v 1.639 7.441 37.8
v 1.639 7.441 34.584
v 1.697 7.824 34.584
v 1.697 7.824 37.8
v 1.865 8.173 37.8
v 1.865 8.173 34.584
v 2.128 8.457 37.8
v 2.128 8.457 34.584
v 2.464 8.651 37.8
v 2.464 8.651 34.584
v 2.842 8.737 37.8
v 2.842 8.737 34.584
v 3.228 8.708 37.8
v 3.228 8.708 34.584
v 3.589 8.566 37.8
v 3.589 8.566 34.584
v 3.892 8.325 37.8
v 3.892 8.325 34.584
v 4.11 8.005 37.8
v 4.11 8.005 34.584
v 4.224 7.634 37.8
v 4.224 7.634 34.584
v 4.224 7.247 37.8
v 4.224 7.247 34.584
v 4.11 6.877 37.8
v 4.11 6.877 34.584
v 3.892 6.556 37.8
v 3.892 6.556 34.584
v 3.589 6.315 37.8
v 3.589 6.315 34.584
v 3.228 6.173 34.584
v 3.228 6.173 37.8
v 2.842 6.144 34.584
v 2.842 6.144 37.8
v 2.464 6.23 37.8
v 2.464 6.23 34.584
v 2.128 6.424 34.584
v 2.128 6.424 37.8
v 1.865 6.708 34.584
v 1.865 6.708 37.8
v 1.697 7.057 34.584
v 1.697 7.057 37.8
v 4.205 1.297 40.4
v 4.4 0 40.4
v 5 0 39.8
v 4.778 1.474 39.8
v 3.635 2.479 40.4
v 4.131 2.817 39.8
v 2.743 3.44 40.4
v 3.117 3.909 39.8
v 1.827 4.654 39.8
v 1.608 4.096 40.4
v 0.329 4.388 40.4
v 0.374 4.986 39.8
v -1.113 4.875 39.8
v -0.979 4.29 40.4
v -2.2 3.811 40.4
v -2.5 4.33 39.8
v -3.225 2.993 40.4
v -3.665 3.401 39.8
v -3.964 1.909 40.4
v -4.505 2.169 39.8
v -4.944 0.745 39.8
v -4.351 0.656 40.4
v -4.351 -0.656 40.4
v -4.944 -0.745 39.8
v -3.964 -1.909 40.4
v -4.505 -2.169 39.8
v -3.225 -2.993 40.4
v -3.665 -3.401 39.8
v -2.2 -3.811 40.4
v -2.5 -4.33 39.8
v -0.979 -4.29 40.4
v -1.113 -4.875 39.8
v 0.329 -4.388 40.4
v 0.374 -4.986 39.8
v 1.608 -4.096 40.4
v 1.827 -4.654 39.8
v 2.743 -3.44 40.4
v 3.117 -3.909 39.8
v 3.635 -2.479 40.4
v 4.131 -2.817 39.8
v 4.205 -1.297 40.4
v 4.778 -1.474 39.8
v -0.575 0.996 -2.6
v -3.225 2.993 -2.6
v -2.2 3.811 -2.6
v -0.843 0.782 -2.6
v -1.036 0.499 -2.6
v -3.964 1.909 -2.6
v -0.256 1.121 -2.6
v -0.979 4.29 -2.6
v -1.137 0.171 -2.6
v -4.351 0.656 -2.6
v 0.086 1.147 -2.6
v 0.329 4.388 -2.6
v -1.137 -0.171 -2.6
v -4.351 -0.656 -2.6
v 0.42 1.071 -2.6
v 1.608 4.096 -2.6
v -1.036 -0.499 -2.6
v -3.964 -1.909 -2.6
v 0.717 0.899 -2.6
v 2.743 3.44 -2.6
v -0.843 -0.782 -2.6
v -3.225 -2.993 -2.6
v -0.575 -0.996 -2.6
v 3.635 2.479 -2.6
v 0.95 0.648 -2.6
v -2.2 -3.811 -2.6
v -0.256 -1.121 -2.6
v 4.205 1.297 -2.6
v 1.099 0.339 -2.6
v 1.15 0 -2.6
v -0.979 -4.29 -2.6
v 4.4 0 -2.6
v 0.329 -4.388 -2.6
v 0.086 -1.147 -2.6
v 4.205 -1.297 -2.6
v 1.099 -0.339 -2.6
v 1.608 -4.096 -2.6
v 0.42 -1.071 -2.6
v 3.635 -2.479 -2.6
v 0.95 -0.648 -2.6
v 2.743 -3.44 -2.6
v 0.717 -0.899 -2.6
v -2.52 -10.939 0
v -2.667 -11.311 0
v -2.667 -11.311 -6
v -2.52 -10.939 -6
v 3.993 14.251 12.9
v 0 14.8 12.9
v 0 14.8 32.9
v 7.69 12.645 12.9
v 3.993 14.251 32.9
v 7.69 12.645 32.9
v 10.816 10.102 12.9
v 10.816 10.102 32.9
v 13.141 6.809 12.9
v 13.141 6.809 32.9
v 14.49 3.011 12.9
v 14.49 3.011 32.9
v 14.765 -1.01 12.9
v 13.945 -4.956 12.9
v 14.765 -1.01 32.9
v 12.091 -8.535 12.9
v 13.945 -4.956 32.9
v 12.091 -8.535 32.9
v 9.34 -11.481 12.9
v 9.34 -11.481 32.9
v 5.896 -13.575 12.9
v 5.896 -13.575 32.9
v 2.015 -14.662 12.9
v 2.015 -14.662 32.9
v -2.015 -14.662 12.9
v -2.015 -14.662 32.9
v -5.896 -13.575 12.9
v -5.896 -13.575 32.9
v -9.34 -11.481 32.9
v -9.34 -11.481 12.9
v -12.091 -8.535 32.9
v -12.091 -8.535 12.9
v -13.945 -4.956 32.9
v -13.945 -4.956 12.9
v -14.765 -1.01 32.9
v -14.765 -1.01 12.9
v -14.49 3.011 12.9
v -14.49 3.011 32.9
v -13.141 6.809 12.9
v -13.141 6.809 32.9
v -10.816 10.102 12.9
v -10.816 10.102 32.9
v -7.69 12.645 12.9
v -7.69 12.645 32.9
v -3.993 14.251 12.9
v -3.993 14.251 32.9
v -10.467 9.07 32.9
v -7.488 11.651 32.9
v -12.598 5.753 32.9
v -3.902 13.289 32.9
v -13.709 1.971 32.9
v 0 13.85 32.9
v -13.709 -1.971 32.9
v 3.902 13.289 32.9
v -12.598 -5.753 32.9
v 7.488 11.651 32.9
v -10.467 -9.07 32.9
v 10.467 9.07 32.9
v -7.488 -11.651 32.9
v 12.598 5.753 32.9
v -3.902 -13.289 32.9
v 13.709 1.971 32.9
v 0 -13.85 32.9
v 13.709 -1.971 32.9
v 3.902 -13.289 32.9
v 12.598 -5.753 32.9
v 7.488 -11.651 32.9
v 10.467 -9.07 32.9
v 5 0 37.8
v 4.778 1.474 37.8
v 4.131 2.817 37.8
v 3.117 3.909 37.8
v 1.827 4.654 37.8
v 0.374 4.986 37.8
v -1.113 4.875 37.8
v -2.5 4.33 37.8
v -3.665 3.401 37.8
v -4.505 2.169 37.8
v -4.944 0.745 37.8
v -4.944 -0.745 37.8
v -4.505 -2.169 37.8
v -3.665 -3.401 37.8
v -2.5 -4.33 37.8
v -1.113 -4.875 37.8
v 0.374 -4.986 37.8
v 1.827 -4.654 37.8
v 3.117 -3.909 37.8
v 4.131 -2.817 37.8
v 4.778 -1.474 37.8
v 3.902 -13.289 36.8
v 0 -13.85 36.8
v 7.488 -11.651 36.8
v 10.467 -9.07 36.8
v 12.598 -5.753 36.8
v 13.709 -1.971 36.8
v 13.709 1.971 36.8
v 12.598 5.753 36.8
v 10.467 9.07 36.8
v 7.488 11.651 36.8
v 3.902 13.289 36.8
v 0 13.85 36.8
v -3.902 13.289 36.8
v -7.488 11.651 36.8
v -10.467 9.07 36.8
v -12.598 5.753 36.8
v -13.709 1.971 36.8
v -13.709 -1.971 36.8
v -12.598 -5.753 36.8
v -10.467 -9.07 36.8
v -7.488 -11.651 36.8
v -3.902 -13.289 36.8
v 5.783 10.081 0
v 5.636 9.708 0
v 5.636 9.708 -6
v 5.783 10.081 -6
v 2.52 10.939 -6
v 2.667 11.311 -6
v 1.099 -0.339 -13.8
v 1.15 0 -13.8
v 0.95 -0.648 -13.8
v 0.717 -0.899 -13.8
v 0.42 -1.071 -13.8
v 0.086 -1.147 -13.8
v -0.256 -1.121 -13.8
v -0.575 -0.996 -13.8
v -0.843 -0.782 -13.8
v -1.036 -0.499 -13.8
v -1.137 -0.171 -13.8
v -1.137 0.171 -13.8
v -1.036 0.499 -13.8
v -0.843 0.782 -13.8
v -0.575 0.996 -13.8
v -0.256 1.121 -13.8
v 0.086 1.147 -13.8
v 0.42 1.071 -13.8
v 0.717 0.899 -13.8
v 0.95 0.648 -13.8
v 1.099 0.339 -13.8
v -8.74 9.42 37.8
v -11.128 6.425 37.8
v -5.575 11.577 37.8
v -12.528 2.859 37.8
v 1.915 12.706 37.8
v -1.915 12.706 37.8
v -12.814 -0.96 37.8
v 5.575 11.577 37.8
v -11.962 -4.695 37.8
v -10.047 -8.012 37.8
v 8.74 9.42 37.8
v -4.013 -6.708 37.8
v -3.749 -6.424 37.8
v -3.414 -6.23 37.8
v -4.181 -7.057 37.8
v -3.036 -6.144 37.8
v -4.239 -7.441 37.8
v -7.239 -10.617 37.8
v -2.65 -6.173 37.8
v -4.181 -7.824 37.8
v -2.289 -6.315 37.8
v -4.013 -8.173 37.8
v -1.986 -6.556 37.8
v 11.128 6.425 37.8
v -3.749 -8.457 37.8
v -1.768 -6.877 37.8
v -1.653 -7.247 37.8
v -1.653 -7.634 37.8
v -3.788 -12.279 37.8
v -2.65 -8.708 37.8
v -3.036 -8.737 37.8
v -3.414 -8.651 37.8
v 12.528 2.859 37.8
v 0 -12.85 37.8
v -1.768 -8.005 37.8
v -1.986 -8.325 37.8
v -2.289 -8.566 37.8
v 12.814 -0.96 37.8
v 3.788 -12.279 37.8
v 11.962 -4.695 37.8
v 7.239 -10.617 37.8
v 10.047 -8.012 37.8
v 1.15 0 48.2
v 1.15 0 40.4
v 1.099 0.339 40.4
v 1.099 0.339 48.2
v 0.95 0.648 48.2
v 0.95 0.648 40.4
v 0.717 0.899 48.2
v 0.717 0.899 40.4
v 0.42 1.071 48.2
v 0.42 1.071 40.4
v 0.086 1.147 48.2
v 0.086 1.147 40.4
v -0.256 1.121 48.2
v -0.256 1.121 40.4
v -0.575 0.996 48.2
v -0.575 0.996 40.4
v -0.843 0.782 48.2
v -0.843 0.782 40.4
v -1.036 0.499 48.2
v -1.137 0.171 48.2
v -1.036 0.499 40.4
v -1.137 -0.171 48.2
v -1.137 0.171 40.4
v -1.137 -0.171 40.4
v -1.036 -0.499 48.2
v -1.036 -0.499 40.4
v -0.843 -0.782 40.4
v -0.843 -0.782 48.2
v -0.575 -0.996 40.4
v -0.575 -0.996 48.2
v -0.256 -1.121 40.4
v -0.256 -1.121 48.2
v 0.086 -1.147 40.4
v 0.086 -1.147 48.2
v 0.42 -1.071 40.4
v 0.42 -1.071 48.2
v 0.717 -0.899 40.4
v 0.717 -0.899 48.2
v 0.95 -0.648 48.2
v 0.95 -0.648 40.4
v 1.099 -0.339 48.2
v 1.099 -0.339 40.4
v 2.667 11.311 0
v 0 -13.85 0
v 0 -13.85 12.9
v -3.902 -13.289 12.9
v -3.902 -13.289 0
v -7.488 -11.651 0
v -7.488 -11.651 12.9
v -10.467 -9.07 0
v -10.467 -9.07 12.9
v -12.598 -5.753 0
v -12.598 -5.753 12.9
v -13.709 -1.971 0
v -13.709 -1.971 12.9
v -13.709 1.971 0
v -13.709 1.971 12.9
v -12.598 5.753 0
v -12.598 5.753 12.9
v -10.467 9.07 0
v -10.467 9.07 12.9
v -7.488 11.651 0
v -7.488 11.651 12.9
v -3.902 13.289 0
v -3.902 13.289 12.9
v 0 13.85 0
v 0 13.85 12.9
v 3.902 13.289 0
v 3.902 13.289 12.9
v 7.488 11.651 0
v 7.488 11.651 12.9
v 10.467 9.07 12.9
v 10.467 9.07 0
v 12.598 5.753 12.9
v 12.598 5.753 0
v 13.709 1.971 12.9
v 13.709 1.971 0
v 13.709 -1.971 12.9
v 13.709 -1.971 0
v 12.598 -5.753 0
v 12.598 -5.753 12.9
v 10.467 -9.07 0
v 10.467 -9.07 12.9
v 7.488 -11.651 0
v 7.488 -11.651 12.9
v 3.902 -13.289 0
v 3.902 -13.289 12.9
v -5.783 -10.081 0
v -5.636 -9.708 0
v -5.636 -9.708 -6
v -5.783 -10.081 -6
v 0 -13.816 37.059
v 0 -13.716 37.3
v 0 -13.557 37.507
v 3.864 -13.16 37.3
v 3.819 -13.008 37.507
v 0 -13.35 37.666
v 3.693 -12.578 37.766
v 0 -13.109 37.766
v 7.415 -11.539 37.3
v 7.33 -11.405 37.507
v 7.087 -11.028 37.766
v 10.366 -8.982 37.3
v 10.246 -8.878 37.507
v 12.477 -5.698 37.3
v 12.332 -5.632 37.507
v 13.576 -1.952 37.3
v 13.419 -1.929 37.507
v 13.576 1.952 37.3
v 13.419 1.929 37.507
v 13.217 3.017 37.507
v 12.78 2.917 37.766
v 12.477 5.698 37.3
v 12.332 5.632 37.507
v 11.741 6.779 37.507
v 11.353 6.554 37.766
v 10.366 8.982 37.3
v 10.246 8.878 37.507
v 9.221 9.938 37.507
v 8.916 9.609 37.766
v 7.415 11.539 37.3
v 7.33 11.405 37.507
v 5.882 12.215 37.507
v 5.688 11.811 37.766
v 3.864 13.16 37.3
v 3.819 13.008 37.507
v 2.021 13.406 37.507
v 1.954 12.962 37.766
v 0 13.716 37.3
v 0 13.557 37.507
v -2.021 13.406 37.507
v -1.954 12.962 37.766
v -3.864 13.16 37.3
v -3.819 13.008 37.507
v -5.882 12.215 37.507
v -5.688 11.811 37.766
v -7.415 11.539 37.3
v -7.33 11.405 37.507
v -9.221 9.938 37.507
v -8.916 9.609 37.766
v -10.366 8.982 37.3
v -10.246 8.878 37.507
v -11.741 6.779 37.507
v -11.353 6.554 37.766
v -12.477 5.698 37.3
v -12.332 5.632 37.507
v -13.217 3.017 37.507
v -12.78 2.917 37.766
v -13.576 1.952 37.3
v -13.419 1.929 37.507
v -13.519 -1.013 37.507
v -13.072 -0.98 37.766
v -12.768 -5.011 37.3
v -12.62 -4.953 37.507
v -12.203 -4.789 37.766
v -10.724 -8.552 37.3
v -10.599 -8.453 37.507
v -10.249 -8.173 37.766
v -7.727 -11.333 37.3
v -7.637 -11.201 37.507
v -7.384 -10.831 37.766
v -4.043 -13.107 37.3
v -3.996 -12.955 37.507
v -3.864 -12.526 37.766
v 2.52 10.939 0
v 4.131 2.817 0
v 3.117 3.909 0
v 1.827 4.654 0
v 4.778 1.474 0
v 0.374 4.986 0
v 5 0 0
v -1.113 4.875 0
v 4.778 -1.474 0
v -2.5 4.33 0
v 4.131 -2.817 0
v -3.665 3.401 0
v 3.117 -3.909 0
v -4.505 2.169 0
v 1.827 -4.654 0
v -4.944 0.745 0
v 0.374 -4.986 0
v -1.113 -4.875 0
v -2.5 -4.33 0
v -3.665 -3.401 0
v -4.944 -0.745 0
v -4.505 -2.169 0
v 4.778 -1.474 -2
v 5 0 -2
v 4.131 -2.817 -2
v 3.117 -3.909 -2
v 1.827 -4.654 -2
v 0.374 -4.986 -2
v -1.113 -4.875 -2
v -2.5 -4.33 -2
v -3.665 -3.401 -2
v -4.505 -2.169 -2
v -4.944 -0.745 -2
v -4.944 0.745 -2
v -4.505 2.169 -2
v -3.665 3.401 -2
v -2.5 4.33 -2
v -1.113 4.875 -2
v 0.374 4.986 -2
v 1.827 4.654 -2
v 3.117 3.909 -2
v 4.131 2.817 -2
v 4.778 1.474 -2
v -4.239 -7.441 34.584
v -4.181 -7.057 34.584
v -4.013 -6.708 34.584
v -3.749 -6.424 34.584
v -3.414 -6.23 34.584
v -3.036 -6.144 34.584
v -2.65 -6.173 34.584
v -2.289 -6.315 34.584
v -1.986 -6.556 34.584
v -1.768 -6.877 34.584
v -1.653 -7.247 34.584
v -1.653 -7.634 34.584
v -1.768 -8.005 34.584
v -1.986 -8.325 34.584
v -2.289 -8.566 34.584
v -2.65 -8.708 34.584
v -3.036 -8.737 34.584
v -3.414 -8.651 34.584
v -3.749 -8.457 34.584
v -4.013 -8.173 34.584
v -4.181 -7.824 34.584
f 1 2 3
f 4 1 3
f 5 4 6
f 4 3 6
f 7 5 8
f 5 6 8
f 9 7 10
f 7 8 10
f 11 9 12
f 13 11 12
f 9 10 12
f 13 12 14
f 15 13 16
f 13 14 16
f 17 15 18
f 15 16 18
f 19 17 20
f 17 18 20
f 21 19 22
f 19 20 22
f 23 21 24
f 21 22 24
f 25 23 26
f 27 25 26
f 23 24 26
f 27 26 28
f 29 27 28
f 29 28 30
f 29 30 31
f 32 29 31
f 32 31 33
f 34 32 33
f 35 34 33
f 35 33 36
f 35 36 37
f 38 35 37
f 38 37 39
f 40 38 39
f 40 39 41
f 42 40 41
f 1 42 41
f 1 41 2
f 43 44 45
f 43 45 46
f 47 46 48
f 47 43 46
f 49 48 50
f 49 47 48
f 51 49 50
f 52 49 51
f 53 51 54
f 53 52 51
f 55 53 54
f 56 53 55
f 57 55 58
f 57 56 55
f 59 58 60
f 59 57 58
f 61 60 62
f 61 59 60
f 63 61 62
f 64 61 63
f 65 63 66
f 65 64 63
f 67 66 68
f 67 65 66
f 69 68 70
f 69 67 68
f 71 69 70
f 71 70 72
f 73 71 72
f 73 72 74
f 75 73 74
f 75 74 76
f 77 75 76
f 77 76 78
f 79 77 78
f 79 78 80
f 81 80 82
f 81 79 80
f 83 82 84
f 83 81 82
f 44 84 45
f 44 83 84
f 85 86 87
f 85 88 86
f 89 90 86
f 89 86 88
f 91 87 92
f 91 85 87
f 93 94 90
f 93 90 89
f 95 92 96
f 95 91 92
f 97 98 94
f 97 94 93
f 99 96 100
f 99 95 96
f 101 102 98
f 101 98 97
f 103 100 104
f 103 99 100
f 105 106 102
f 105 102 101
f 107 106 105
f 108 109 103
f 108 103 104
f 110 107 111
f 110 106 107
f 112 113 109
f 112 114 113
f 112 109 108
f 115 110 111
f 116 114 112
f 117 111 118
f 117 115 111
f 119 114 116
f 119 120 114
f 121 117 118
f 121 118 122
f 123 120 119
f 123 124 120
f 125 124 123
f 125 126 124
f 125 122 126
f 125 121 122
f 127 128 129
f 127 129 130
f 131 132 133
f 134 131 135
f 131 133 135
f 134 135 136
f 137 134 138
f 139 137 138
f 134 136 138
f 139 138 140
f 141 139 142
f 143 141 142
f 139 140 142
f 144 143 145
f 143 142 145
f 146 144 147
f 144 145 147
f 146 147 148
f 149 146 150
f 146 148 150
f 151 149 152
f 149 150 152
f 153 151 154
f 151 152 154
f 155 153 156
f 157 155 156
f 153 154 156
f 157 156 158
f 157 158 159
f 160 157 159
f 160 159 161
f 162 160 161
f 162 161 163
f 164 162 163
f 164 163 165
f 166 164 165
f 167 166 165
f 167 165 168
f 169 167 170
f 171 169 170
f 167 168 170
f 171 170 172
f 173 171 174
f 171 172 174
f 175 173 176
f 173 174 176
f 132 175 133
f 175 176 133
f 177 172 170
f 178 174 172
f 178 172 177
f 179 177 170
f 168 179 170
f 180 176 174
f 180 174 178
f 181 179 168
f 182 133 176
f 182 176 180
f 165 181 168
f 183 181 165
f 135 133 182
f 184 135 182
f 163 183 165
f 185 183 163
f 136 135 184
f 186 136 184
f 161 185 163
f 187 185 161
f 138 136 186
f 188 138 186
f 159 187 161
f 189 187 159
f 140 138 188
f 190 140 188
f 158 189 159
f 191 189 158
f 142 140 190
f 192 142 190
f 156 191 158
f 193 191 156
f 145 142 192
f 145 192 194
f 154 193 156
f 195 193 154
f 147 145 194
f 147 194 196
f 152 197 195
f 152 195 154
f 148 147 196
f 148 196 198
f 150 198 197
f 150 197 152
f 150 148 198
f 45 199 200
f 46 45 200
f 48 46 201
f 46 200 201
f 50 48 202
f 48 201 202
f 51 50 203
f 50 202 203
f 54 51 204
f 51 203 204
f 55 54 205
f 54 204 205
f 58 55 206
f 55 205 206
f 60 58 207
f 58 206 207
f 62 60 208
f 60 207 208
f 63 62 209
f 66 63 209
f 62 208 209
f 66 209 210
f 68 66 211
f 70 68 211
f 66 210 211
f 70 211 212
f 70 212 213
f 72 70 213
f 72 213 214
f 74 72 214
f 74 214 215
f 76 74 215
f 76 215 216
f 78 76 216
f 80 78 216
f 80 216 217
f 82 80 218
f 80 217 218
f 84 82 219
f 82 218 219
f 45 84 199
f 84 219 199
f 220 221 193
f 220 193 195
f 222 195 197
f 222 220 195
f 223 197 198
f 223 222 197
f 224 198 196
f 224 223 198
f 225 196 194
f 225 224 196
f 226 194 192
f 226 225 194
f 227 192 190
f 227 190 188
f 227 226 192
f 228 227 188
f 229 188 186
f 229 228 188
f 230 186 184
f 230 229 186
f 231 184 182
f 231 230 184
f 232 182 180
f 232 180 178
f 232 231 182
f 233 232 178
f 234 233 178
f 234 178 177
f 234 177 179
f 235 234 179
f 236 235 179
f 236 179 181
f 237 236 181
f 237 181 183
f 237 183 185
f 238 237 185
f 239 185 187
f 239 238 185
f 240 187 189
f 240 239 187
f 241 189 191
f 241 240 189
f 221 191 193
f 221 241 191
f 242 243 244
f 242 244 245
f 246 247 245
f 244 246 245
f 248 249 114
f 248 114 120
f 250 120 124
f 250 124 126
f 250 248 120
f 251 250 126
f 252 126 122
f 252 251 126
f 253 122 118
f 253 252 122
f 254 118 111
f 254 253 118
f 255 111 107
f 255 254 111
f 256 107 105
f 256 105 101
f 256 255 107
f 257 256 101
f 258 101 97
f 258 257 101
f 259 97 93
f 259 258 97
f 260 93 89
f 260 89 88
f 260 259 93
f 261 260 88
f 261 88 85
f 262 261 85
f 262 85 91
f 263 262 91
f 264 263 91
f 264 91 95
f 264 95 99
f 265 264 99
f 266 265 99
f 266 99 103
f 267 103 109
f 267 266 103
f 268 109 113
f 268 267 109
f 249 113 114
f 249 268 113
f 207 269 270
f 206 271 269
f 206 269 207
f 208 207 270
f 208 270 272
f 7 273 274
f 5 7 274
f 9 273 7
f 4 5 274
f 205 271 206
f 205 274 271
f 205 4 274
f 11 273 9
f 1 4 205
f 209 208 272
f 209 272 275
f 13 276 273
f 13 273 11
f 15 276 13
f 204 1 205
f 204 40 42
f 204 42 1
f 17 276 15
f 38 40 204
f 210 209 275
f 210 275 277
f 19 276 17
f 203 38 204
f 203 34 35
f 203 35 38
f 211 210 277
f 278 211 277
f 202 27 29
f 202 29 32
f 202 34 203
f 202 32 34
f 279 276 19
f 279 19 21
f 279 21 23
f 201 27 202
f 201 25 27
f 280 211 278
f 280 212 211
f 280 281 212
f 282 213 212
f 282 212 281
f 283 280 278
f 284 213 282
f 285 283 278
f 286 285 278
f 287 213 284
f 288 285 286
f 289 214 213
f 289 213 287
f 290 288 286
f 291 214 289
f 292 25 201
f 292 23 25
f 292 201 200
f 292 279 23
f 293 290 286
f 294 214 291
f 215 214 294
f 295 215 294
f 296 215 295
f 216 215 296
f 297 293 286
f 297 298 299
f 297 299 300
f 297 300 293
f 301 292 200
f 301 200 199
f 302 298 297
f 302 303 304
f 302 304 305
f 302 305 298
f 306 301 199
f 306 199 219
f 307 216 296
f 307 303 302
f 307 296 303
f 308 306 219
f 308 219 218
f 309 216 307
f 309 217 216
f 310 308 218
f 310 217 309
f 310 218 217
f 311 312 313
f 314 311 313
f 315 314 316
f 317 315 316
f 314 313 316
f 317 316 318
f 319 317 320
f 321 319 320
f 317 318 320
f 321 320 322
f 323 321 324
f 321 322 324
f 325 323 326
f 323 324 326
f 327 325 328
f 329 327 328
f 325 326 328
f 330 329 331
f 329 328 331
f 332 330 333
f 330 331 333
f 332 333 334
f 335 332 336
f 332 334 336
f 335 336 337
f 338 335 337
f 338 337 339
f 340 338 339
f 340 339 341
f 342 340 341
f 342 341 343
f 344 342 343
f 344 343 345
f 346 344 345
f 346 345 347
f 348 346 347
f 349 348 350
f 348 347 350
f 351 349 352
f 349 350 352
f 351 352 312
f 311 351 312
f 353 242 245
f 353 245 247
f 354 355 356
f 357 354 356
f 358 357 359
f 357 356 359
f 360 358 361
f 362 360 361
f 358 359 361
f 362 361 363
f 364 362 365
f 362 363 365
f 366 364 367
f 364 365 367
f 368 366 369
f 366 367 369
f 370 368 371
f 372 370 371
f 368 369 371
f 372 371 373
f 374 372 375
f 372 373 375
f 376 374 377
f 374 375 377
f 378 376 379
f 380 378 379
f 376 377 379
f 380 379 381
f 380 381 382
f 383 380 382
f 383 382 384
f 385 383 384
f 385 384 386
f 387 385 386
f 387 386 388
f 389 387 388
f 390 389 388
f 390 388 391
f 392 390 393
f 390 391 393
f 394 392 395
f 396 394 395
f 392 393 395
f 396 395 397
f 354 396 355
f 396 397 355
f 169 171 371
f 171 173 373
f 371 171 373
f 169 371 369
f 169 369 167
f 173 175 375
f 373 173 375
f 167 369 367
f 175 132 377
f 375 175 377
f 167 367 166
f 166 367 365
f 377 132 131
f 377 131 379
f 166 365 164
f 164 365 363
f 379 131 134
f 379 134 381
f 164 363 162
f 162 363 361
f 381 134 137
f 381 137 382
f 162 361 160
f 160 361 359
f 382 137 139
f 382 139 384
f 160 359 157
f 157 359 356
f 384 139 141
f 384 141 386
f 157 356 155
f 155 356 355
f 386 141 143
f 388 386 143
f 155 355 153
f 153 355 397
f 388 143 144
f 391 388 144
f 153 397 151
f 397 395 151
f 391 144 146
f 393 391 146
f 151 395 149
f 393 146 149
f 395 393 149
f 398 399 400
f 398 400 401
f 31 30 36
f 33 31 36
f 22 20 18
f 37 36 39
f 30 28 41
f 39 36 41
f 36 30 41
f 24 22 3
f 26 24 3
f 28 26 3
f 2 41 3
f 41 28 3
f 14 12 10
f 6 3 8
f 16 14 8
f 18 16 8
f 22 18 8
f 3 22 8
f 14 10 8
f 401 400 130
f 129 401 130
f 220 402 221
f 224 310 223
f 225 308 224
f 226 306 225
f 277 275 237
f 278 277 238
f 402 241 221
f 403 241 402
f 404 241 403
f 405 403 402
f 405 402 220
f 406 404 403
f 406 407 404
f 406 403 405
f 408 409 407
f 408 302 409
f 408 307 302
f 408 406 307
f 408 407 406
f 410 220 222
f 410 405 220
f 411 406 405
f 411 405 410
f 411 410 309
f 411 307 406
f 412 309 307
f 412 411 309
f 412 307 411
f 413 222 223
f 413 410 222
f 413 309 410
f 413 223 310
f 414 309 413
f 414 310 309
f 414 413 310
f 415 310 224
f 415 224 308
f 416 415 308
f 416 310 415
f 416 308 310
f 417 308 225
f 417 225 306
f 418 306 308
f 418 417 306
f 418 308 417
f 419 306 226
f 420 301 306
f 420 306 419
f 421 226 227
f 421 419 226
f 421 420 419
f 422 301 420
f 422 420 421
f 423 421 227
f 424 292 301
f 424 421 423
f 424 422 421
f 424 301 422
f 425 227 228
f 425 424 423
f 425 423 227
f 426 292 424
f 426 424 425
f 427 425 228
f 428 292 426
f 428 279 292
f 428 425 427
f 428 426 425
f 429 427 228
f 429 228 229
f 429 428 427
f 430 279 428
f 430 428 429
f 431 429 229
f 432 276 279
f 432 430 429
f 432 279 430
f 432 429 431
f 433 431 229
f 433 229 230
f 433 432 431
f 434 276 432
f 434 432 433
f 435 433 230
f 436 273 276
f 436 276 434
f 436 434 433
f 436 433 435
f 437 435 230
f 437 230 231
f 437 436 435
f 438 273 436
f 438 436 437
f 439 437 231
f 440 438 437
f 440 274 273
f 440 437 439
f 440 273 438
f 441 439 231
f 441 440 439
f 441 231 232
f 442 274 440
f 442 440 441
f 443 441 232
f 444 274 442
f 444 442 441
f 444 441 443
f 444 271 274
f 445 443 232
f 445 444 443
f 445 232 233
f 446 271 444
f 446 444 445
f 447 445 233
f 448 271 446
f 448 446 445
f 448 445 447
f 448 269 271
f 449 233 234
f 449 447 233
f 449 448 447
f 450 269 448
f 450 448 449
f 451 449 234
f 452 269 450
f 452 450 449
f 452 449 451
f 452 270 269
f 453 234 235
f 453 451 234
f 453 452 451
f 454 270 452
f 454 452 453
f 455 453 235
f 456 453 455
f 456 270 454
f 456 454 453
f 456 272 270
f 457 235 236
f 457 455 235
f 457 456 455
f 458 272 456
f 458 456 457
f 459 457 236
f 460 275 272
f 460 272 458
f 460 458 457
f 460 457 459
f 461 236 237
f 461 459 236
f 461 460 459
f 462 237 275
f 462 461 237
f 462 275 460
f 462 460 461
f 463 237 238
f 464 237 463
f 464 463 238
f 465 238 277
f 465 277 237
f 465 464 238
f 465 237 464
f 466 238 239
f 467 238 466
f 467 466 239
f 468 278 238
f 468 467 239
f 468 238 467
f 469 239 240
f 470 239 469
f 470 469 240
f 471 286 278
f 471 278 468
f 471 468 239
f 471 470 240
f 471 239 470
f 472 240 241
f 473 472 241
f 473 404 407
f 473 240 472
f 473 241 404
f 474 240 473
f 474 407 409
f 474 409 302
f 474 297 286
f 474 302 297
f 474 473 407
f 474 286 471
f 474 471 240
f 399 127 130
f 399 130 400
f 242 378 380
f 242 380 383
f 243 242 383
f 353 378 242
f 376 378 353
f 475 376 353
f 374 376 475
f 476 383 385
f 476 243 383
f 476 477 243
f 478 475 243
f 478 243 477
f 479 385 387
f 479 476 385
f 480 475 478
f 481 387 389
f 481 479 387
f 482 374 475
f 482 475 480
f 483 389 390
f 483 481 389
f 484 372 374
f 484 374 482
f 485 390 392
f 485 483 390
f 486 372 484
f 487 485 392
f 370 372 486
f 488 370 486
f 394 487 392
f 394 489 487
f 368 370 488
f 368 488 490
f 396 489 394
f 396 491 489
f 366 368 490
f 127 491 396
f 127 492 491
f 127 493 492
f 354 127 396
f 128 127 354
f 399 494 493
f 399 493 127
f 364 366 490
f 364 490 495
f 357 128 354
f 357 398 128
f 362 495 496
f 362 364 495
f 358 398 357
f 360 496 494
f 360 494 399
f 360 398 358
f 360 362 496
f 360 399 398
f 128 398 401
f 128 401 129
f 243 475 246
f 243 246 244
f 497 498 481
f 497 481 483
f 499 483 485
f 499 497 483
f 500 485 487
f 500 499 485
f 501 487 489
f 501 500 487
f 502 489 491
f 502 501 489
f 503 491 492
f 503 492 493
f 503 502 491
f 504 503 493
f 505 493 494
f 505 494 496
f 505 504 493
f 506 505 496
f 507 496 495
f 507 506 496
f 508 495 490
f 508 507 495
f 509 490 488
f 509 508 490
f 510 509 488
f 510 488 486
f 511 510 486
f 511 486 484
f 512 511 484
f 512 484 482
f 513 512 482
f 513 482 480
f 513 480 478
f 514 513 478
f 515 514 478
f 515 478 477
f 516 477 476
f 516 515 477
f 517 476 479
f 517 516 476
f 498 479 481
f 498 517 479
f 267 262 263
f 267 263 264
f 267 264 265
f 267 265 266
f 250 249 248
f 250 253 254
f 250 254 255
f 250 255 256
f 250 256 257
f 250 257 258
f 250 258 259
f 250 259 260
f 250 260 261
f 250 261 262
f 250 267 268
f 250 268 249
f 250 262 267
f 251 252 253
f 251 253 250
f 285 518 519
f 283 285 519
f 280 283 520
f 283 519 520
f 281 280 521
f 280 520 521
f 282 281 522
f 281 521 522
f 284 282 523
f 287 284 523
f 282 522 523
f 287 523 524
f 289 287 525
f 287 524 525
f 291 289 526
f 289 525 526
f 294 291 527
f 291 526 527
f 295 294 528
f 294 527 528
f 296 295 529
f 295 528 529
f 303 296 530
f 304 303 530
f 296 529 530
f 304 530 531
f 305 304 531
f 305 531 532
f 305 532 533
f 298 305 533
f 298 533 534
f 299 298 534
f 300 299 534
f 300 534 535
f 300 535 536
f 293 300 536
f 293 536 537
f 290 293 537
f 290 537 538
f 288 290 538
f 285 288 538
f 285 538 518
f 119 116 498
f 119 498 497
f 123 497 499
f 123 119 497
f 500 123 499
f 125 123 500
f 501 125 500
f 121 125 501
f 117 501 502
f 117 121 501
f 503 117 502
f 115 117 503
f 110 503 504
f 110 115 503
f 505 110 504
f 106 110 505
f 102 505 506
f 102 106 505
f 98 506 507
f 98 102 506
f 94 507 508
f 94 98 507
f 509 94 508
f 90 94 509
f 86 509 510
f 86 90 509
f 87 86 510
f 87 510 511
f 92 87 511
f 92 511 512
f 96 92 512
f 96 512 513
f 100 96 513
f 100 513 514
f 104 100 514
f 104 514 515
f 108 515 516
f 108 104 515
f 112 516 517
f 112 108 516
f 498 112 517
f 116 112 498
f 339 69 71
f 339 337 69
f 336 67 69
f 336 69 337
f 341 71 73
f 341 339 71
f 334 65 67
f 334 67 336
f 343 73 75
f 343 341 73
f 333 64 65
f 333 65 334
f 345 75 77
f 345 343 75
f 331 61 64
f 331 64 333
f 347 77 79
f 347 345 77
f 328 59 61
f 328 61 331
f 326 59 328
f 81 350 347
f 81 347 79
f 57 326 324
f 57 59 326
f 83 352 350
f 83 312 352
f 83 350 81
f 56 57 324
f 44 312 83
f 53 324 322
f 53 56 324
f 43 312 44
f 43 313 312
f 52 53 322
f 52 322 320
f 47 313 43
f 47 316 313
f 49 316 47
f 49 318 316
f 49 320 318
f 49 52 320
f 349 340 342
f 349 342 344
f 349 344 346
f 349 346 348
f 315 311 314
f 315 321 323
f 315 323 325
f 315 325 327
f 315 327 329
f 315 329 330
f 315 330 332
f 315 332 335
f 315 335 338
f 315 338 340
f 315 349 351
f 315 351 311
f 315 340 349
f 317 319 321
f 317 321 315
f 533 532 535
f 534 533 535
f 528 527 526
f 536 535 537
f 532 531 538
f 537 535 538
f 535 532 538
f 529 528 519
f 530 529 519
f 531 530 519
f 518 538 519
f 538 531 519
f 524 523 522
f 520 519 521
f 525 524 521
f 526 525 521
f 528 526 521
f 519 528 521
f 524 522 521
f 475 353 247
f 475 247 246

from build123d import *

# Parameters (mm, degrees)
SKETCH1_W                      = 14.8
SKETCH1_H                      = 20
SKETCH2_R                      = 13.85
BOSS_EXTRUDE1_DEPTH            = 12.9
BOSS_EXTRUDE2_DEPTH            = 6
BOSS_EXTRUDE3_DEPTH            = 6
BOSS_EXTRUDE4_START            = 4.9
SKETCH5_R                      = 13.85
BOSS_EXTRUDE4_DEPTH            = 4.9
SKETCH6_R                      = 5
BOSS_EXTRUDE5_DEPTH            = 2.6
SKETCH7_R                      = 1.15
BOSS_EXTRUDE6_DEPTH            = 7.8
BOSS_EXTRUDE7_START            = 2.6
SKETCH8_R                      = 5
BOSS_EXTRUDE7_DEPTH            = 2.6
BOSS_EXTRUDE8_START            = 11.2
SKETCH9_R                      = 1.15
BOSS_EXTRUDE8_DEPTH            = 11.2
F_2_6_2_6_DIAMETER_HOLE1_D     = 2.6
F_2_6_2_6_DIAMETER_HOLE1_DEPTH = 3.216319987
CHAMFER1_SIZE                  = 0.6
FILLET1_R                      = 1


with BuildPart() as part:
    # Sketch1 → Revolve1 (revolve)
    with BuildSketch(Plane.XZ, mode=Mode.PRIVATE) as revolve1_sk:
        with Locations((7.4, 22.9)):
            Rectangle(SKETCH1_W, SKETCH1_H)
    revolve(revolve1_sk.sketch.rotate(Axis((0, 0, 32.9), (0, 0, -1)), 270), axis=Axis((0, 0, 32.9), (0, 0, -1)))

    # Sketch2 → Boss-Extrude1 (add)
    with BuildSketch(Plane(origin=(0, 0, 12.9), x_dir=(-1, 0, 0), z_dir=(0, 0, -1))):
        with Locations(Location((0, 0, 0), (0, 0, 270))):
            Circle(SKETCH2_R)
    extrude(amount=BOSS_EXTRUDE1_DEPTH)

    # Sketch3 → Boss-Extrude2 (add)
    with BuildSketch(Plane(origin=(0, 0, 0), x_dir=(-1, 0, 0), z_dir=(0, 0, -1))):
        Polygon((-5.782608477, 10.080528964), (-2.666854949, 11.311211681), (-2.519907759, 10.939181409), (-5.635661287, 9.708498692), align=None)
    extrude(amount=BOSS_EXTRUDE2_DEPTH)

    # Sketch4 → Boss-Extrude3 (add)
    with BuildSketch(Plane(origin=(0, 0, 0), x_dir=(-1, 0, 0), z_dir=(0, 0, -1))):
        Polygon((2.519907759, -10.939181409), (5.635661287, -9.708498692), (5.782608477, -10.080528964), (2.666854949, -11.311211681), align=None)
    extrude(amount=BOSS_EXTRUDE3_DEPTH)

    # Sketch5 → Boss-Extrude4 (add)
    with BuildSketch(Plane.XY.offset(32.9).offset(BOSS_EXTRUDE4_START)):
        with Locations(Location((0, 0, 0), (0, 0, 270))):
            Circle(SKETCH5_R)
    extrude(amount=-BOSS_EXTRUDE4_DEPTH)

    # Sketch6 → Boss-Extrude5 (add)
    with BuildSketch(Plane.XY.offset(37.8)):
        Circle(SKETCH6_R)
    extrude(amount=BOSS_EXTRUDE5_DEPTH)

    # Sketch7 → Boss-Extrude6 (add)
    with BuildSketch(Plane.XY.offset(40.4)):
        Circle(SKETCH7_R)
    extrude(amount=BOSS_EXTRUDE6_DEPTH)

    # Sketch8 → Boss-Extrude7 (add)
    with BuildSketch(Plane(origin=(0, 0, 0), x_dir=(-1, 0, 0), z_dir=(0, 0, -1)).offset(BOSS_EXTRUDE7_START)):
        with Locations(Location((0, 0, 0), (0, 0, 180))):
            Circle(SKETCH8_R)
    extrude(amount=-BOSS_EXTRUDE7_DEPTH)

    # Sketch9 → Boss-Extrude8 (add)
    with BuildSketch(Plane(origin=(0, 0, -2.6), x_dir=(-1, 0, 0), z_dir=(0, 0, -1)).offset(BOSS_EXTRUDE8_START)):
        with Locations(Location((0, 0, 0), (0, 0, 180))):
            Circle(SKETCH9_R)
    extrude(amount=-BOSS_EXTRUDE8_DEPTH)

    # Ø2.6 (2.6) Diameter Hole1
    with Locations(Plane.XY.offset(37.8)):
        with Locations((-2.9389438, -7.440605442), (2.9389438, 7.440605442)):
            Hole(F_2_6_2_6_DIAMETER_HOLE1_D / 2, depth=F_2_6_2_6_DIAMETER_HOLE1_DEPTH)

    # Chamfer1
    chamfer1_edges = [part.edges().sort_by_distance(p)[0] for p in [
        (-5, 0, 40.4),
        (-5, 0, -2.6),
    ]]
    chamfer(chamfer1_edges, length=CHAMFER1_SIZE)

    # Fillet1
    fillet1_edges = [part.edges().sort_by_distance(p)[0] for p in [
        (0, 13.85, 37.8),
    ]]
    fillet(fillet1_edges, radius=FILLET1_R)


solid = part.part
